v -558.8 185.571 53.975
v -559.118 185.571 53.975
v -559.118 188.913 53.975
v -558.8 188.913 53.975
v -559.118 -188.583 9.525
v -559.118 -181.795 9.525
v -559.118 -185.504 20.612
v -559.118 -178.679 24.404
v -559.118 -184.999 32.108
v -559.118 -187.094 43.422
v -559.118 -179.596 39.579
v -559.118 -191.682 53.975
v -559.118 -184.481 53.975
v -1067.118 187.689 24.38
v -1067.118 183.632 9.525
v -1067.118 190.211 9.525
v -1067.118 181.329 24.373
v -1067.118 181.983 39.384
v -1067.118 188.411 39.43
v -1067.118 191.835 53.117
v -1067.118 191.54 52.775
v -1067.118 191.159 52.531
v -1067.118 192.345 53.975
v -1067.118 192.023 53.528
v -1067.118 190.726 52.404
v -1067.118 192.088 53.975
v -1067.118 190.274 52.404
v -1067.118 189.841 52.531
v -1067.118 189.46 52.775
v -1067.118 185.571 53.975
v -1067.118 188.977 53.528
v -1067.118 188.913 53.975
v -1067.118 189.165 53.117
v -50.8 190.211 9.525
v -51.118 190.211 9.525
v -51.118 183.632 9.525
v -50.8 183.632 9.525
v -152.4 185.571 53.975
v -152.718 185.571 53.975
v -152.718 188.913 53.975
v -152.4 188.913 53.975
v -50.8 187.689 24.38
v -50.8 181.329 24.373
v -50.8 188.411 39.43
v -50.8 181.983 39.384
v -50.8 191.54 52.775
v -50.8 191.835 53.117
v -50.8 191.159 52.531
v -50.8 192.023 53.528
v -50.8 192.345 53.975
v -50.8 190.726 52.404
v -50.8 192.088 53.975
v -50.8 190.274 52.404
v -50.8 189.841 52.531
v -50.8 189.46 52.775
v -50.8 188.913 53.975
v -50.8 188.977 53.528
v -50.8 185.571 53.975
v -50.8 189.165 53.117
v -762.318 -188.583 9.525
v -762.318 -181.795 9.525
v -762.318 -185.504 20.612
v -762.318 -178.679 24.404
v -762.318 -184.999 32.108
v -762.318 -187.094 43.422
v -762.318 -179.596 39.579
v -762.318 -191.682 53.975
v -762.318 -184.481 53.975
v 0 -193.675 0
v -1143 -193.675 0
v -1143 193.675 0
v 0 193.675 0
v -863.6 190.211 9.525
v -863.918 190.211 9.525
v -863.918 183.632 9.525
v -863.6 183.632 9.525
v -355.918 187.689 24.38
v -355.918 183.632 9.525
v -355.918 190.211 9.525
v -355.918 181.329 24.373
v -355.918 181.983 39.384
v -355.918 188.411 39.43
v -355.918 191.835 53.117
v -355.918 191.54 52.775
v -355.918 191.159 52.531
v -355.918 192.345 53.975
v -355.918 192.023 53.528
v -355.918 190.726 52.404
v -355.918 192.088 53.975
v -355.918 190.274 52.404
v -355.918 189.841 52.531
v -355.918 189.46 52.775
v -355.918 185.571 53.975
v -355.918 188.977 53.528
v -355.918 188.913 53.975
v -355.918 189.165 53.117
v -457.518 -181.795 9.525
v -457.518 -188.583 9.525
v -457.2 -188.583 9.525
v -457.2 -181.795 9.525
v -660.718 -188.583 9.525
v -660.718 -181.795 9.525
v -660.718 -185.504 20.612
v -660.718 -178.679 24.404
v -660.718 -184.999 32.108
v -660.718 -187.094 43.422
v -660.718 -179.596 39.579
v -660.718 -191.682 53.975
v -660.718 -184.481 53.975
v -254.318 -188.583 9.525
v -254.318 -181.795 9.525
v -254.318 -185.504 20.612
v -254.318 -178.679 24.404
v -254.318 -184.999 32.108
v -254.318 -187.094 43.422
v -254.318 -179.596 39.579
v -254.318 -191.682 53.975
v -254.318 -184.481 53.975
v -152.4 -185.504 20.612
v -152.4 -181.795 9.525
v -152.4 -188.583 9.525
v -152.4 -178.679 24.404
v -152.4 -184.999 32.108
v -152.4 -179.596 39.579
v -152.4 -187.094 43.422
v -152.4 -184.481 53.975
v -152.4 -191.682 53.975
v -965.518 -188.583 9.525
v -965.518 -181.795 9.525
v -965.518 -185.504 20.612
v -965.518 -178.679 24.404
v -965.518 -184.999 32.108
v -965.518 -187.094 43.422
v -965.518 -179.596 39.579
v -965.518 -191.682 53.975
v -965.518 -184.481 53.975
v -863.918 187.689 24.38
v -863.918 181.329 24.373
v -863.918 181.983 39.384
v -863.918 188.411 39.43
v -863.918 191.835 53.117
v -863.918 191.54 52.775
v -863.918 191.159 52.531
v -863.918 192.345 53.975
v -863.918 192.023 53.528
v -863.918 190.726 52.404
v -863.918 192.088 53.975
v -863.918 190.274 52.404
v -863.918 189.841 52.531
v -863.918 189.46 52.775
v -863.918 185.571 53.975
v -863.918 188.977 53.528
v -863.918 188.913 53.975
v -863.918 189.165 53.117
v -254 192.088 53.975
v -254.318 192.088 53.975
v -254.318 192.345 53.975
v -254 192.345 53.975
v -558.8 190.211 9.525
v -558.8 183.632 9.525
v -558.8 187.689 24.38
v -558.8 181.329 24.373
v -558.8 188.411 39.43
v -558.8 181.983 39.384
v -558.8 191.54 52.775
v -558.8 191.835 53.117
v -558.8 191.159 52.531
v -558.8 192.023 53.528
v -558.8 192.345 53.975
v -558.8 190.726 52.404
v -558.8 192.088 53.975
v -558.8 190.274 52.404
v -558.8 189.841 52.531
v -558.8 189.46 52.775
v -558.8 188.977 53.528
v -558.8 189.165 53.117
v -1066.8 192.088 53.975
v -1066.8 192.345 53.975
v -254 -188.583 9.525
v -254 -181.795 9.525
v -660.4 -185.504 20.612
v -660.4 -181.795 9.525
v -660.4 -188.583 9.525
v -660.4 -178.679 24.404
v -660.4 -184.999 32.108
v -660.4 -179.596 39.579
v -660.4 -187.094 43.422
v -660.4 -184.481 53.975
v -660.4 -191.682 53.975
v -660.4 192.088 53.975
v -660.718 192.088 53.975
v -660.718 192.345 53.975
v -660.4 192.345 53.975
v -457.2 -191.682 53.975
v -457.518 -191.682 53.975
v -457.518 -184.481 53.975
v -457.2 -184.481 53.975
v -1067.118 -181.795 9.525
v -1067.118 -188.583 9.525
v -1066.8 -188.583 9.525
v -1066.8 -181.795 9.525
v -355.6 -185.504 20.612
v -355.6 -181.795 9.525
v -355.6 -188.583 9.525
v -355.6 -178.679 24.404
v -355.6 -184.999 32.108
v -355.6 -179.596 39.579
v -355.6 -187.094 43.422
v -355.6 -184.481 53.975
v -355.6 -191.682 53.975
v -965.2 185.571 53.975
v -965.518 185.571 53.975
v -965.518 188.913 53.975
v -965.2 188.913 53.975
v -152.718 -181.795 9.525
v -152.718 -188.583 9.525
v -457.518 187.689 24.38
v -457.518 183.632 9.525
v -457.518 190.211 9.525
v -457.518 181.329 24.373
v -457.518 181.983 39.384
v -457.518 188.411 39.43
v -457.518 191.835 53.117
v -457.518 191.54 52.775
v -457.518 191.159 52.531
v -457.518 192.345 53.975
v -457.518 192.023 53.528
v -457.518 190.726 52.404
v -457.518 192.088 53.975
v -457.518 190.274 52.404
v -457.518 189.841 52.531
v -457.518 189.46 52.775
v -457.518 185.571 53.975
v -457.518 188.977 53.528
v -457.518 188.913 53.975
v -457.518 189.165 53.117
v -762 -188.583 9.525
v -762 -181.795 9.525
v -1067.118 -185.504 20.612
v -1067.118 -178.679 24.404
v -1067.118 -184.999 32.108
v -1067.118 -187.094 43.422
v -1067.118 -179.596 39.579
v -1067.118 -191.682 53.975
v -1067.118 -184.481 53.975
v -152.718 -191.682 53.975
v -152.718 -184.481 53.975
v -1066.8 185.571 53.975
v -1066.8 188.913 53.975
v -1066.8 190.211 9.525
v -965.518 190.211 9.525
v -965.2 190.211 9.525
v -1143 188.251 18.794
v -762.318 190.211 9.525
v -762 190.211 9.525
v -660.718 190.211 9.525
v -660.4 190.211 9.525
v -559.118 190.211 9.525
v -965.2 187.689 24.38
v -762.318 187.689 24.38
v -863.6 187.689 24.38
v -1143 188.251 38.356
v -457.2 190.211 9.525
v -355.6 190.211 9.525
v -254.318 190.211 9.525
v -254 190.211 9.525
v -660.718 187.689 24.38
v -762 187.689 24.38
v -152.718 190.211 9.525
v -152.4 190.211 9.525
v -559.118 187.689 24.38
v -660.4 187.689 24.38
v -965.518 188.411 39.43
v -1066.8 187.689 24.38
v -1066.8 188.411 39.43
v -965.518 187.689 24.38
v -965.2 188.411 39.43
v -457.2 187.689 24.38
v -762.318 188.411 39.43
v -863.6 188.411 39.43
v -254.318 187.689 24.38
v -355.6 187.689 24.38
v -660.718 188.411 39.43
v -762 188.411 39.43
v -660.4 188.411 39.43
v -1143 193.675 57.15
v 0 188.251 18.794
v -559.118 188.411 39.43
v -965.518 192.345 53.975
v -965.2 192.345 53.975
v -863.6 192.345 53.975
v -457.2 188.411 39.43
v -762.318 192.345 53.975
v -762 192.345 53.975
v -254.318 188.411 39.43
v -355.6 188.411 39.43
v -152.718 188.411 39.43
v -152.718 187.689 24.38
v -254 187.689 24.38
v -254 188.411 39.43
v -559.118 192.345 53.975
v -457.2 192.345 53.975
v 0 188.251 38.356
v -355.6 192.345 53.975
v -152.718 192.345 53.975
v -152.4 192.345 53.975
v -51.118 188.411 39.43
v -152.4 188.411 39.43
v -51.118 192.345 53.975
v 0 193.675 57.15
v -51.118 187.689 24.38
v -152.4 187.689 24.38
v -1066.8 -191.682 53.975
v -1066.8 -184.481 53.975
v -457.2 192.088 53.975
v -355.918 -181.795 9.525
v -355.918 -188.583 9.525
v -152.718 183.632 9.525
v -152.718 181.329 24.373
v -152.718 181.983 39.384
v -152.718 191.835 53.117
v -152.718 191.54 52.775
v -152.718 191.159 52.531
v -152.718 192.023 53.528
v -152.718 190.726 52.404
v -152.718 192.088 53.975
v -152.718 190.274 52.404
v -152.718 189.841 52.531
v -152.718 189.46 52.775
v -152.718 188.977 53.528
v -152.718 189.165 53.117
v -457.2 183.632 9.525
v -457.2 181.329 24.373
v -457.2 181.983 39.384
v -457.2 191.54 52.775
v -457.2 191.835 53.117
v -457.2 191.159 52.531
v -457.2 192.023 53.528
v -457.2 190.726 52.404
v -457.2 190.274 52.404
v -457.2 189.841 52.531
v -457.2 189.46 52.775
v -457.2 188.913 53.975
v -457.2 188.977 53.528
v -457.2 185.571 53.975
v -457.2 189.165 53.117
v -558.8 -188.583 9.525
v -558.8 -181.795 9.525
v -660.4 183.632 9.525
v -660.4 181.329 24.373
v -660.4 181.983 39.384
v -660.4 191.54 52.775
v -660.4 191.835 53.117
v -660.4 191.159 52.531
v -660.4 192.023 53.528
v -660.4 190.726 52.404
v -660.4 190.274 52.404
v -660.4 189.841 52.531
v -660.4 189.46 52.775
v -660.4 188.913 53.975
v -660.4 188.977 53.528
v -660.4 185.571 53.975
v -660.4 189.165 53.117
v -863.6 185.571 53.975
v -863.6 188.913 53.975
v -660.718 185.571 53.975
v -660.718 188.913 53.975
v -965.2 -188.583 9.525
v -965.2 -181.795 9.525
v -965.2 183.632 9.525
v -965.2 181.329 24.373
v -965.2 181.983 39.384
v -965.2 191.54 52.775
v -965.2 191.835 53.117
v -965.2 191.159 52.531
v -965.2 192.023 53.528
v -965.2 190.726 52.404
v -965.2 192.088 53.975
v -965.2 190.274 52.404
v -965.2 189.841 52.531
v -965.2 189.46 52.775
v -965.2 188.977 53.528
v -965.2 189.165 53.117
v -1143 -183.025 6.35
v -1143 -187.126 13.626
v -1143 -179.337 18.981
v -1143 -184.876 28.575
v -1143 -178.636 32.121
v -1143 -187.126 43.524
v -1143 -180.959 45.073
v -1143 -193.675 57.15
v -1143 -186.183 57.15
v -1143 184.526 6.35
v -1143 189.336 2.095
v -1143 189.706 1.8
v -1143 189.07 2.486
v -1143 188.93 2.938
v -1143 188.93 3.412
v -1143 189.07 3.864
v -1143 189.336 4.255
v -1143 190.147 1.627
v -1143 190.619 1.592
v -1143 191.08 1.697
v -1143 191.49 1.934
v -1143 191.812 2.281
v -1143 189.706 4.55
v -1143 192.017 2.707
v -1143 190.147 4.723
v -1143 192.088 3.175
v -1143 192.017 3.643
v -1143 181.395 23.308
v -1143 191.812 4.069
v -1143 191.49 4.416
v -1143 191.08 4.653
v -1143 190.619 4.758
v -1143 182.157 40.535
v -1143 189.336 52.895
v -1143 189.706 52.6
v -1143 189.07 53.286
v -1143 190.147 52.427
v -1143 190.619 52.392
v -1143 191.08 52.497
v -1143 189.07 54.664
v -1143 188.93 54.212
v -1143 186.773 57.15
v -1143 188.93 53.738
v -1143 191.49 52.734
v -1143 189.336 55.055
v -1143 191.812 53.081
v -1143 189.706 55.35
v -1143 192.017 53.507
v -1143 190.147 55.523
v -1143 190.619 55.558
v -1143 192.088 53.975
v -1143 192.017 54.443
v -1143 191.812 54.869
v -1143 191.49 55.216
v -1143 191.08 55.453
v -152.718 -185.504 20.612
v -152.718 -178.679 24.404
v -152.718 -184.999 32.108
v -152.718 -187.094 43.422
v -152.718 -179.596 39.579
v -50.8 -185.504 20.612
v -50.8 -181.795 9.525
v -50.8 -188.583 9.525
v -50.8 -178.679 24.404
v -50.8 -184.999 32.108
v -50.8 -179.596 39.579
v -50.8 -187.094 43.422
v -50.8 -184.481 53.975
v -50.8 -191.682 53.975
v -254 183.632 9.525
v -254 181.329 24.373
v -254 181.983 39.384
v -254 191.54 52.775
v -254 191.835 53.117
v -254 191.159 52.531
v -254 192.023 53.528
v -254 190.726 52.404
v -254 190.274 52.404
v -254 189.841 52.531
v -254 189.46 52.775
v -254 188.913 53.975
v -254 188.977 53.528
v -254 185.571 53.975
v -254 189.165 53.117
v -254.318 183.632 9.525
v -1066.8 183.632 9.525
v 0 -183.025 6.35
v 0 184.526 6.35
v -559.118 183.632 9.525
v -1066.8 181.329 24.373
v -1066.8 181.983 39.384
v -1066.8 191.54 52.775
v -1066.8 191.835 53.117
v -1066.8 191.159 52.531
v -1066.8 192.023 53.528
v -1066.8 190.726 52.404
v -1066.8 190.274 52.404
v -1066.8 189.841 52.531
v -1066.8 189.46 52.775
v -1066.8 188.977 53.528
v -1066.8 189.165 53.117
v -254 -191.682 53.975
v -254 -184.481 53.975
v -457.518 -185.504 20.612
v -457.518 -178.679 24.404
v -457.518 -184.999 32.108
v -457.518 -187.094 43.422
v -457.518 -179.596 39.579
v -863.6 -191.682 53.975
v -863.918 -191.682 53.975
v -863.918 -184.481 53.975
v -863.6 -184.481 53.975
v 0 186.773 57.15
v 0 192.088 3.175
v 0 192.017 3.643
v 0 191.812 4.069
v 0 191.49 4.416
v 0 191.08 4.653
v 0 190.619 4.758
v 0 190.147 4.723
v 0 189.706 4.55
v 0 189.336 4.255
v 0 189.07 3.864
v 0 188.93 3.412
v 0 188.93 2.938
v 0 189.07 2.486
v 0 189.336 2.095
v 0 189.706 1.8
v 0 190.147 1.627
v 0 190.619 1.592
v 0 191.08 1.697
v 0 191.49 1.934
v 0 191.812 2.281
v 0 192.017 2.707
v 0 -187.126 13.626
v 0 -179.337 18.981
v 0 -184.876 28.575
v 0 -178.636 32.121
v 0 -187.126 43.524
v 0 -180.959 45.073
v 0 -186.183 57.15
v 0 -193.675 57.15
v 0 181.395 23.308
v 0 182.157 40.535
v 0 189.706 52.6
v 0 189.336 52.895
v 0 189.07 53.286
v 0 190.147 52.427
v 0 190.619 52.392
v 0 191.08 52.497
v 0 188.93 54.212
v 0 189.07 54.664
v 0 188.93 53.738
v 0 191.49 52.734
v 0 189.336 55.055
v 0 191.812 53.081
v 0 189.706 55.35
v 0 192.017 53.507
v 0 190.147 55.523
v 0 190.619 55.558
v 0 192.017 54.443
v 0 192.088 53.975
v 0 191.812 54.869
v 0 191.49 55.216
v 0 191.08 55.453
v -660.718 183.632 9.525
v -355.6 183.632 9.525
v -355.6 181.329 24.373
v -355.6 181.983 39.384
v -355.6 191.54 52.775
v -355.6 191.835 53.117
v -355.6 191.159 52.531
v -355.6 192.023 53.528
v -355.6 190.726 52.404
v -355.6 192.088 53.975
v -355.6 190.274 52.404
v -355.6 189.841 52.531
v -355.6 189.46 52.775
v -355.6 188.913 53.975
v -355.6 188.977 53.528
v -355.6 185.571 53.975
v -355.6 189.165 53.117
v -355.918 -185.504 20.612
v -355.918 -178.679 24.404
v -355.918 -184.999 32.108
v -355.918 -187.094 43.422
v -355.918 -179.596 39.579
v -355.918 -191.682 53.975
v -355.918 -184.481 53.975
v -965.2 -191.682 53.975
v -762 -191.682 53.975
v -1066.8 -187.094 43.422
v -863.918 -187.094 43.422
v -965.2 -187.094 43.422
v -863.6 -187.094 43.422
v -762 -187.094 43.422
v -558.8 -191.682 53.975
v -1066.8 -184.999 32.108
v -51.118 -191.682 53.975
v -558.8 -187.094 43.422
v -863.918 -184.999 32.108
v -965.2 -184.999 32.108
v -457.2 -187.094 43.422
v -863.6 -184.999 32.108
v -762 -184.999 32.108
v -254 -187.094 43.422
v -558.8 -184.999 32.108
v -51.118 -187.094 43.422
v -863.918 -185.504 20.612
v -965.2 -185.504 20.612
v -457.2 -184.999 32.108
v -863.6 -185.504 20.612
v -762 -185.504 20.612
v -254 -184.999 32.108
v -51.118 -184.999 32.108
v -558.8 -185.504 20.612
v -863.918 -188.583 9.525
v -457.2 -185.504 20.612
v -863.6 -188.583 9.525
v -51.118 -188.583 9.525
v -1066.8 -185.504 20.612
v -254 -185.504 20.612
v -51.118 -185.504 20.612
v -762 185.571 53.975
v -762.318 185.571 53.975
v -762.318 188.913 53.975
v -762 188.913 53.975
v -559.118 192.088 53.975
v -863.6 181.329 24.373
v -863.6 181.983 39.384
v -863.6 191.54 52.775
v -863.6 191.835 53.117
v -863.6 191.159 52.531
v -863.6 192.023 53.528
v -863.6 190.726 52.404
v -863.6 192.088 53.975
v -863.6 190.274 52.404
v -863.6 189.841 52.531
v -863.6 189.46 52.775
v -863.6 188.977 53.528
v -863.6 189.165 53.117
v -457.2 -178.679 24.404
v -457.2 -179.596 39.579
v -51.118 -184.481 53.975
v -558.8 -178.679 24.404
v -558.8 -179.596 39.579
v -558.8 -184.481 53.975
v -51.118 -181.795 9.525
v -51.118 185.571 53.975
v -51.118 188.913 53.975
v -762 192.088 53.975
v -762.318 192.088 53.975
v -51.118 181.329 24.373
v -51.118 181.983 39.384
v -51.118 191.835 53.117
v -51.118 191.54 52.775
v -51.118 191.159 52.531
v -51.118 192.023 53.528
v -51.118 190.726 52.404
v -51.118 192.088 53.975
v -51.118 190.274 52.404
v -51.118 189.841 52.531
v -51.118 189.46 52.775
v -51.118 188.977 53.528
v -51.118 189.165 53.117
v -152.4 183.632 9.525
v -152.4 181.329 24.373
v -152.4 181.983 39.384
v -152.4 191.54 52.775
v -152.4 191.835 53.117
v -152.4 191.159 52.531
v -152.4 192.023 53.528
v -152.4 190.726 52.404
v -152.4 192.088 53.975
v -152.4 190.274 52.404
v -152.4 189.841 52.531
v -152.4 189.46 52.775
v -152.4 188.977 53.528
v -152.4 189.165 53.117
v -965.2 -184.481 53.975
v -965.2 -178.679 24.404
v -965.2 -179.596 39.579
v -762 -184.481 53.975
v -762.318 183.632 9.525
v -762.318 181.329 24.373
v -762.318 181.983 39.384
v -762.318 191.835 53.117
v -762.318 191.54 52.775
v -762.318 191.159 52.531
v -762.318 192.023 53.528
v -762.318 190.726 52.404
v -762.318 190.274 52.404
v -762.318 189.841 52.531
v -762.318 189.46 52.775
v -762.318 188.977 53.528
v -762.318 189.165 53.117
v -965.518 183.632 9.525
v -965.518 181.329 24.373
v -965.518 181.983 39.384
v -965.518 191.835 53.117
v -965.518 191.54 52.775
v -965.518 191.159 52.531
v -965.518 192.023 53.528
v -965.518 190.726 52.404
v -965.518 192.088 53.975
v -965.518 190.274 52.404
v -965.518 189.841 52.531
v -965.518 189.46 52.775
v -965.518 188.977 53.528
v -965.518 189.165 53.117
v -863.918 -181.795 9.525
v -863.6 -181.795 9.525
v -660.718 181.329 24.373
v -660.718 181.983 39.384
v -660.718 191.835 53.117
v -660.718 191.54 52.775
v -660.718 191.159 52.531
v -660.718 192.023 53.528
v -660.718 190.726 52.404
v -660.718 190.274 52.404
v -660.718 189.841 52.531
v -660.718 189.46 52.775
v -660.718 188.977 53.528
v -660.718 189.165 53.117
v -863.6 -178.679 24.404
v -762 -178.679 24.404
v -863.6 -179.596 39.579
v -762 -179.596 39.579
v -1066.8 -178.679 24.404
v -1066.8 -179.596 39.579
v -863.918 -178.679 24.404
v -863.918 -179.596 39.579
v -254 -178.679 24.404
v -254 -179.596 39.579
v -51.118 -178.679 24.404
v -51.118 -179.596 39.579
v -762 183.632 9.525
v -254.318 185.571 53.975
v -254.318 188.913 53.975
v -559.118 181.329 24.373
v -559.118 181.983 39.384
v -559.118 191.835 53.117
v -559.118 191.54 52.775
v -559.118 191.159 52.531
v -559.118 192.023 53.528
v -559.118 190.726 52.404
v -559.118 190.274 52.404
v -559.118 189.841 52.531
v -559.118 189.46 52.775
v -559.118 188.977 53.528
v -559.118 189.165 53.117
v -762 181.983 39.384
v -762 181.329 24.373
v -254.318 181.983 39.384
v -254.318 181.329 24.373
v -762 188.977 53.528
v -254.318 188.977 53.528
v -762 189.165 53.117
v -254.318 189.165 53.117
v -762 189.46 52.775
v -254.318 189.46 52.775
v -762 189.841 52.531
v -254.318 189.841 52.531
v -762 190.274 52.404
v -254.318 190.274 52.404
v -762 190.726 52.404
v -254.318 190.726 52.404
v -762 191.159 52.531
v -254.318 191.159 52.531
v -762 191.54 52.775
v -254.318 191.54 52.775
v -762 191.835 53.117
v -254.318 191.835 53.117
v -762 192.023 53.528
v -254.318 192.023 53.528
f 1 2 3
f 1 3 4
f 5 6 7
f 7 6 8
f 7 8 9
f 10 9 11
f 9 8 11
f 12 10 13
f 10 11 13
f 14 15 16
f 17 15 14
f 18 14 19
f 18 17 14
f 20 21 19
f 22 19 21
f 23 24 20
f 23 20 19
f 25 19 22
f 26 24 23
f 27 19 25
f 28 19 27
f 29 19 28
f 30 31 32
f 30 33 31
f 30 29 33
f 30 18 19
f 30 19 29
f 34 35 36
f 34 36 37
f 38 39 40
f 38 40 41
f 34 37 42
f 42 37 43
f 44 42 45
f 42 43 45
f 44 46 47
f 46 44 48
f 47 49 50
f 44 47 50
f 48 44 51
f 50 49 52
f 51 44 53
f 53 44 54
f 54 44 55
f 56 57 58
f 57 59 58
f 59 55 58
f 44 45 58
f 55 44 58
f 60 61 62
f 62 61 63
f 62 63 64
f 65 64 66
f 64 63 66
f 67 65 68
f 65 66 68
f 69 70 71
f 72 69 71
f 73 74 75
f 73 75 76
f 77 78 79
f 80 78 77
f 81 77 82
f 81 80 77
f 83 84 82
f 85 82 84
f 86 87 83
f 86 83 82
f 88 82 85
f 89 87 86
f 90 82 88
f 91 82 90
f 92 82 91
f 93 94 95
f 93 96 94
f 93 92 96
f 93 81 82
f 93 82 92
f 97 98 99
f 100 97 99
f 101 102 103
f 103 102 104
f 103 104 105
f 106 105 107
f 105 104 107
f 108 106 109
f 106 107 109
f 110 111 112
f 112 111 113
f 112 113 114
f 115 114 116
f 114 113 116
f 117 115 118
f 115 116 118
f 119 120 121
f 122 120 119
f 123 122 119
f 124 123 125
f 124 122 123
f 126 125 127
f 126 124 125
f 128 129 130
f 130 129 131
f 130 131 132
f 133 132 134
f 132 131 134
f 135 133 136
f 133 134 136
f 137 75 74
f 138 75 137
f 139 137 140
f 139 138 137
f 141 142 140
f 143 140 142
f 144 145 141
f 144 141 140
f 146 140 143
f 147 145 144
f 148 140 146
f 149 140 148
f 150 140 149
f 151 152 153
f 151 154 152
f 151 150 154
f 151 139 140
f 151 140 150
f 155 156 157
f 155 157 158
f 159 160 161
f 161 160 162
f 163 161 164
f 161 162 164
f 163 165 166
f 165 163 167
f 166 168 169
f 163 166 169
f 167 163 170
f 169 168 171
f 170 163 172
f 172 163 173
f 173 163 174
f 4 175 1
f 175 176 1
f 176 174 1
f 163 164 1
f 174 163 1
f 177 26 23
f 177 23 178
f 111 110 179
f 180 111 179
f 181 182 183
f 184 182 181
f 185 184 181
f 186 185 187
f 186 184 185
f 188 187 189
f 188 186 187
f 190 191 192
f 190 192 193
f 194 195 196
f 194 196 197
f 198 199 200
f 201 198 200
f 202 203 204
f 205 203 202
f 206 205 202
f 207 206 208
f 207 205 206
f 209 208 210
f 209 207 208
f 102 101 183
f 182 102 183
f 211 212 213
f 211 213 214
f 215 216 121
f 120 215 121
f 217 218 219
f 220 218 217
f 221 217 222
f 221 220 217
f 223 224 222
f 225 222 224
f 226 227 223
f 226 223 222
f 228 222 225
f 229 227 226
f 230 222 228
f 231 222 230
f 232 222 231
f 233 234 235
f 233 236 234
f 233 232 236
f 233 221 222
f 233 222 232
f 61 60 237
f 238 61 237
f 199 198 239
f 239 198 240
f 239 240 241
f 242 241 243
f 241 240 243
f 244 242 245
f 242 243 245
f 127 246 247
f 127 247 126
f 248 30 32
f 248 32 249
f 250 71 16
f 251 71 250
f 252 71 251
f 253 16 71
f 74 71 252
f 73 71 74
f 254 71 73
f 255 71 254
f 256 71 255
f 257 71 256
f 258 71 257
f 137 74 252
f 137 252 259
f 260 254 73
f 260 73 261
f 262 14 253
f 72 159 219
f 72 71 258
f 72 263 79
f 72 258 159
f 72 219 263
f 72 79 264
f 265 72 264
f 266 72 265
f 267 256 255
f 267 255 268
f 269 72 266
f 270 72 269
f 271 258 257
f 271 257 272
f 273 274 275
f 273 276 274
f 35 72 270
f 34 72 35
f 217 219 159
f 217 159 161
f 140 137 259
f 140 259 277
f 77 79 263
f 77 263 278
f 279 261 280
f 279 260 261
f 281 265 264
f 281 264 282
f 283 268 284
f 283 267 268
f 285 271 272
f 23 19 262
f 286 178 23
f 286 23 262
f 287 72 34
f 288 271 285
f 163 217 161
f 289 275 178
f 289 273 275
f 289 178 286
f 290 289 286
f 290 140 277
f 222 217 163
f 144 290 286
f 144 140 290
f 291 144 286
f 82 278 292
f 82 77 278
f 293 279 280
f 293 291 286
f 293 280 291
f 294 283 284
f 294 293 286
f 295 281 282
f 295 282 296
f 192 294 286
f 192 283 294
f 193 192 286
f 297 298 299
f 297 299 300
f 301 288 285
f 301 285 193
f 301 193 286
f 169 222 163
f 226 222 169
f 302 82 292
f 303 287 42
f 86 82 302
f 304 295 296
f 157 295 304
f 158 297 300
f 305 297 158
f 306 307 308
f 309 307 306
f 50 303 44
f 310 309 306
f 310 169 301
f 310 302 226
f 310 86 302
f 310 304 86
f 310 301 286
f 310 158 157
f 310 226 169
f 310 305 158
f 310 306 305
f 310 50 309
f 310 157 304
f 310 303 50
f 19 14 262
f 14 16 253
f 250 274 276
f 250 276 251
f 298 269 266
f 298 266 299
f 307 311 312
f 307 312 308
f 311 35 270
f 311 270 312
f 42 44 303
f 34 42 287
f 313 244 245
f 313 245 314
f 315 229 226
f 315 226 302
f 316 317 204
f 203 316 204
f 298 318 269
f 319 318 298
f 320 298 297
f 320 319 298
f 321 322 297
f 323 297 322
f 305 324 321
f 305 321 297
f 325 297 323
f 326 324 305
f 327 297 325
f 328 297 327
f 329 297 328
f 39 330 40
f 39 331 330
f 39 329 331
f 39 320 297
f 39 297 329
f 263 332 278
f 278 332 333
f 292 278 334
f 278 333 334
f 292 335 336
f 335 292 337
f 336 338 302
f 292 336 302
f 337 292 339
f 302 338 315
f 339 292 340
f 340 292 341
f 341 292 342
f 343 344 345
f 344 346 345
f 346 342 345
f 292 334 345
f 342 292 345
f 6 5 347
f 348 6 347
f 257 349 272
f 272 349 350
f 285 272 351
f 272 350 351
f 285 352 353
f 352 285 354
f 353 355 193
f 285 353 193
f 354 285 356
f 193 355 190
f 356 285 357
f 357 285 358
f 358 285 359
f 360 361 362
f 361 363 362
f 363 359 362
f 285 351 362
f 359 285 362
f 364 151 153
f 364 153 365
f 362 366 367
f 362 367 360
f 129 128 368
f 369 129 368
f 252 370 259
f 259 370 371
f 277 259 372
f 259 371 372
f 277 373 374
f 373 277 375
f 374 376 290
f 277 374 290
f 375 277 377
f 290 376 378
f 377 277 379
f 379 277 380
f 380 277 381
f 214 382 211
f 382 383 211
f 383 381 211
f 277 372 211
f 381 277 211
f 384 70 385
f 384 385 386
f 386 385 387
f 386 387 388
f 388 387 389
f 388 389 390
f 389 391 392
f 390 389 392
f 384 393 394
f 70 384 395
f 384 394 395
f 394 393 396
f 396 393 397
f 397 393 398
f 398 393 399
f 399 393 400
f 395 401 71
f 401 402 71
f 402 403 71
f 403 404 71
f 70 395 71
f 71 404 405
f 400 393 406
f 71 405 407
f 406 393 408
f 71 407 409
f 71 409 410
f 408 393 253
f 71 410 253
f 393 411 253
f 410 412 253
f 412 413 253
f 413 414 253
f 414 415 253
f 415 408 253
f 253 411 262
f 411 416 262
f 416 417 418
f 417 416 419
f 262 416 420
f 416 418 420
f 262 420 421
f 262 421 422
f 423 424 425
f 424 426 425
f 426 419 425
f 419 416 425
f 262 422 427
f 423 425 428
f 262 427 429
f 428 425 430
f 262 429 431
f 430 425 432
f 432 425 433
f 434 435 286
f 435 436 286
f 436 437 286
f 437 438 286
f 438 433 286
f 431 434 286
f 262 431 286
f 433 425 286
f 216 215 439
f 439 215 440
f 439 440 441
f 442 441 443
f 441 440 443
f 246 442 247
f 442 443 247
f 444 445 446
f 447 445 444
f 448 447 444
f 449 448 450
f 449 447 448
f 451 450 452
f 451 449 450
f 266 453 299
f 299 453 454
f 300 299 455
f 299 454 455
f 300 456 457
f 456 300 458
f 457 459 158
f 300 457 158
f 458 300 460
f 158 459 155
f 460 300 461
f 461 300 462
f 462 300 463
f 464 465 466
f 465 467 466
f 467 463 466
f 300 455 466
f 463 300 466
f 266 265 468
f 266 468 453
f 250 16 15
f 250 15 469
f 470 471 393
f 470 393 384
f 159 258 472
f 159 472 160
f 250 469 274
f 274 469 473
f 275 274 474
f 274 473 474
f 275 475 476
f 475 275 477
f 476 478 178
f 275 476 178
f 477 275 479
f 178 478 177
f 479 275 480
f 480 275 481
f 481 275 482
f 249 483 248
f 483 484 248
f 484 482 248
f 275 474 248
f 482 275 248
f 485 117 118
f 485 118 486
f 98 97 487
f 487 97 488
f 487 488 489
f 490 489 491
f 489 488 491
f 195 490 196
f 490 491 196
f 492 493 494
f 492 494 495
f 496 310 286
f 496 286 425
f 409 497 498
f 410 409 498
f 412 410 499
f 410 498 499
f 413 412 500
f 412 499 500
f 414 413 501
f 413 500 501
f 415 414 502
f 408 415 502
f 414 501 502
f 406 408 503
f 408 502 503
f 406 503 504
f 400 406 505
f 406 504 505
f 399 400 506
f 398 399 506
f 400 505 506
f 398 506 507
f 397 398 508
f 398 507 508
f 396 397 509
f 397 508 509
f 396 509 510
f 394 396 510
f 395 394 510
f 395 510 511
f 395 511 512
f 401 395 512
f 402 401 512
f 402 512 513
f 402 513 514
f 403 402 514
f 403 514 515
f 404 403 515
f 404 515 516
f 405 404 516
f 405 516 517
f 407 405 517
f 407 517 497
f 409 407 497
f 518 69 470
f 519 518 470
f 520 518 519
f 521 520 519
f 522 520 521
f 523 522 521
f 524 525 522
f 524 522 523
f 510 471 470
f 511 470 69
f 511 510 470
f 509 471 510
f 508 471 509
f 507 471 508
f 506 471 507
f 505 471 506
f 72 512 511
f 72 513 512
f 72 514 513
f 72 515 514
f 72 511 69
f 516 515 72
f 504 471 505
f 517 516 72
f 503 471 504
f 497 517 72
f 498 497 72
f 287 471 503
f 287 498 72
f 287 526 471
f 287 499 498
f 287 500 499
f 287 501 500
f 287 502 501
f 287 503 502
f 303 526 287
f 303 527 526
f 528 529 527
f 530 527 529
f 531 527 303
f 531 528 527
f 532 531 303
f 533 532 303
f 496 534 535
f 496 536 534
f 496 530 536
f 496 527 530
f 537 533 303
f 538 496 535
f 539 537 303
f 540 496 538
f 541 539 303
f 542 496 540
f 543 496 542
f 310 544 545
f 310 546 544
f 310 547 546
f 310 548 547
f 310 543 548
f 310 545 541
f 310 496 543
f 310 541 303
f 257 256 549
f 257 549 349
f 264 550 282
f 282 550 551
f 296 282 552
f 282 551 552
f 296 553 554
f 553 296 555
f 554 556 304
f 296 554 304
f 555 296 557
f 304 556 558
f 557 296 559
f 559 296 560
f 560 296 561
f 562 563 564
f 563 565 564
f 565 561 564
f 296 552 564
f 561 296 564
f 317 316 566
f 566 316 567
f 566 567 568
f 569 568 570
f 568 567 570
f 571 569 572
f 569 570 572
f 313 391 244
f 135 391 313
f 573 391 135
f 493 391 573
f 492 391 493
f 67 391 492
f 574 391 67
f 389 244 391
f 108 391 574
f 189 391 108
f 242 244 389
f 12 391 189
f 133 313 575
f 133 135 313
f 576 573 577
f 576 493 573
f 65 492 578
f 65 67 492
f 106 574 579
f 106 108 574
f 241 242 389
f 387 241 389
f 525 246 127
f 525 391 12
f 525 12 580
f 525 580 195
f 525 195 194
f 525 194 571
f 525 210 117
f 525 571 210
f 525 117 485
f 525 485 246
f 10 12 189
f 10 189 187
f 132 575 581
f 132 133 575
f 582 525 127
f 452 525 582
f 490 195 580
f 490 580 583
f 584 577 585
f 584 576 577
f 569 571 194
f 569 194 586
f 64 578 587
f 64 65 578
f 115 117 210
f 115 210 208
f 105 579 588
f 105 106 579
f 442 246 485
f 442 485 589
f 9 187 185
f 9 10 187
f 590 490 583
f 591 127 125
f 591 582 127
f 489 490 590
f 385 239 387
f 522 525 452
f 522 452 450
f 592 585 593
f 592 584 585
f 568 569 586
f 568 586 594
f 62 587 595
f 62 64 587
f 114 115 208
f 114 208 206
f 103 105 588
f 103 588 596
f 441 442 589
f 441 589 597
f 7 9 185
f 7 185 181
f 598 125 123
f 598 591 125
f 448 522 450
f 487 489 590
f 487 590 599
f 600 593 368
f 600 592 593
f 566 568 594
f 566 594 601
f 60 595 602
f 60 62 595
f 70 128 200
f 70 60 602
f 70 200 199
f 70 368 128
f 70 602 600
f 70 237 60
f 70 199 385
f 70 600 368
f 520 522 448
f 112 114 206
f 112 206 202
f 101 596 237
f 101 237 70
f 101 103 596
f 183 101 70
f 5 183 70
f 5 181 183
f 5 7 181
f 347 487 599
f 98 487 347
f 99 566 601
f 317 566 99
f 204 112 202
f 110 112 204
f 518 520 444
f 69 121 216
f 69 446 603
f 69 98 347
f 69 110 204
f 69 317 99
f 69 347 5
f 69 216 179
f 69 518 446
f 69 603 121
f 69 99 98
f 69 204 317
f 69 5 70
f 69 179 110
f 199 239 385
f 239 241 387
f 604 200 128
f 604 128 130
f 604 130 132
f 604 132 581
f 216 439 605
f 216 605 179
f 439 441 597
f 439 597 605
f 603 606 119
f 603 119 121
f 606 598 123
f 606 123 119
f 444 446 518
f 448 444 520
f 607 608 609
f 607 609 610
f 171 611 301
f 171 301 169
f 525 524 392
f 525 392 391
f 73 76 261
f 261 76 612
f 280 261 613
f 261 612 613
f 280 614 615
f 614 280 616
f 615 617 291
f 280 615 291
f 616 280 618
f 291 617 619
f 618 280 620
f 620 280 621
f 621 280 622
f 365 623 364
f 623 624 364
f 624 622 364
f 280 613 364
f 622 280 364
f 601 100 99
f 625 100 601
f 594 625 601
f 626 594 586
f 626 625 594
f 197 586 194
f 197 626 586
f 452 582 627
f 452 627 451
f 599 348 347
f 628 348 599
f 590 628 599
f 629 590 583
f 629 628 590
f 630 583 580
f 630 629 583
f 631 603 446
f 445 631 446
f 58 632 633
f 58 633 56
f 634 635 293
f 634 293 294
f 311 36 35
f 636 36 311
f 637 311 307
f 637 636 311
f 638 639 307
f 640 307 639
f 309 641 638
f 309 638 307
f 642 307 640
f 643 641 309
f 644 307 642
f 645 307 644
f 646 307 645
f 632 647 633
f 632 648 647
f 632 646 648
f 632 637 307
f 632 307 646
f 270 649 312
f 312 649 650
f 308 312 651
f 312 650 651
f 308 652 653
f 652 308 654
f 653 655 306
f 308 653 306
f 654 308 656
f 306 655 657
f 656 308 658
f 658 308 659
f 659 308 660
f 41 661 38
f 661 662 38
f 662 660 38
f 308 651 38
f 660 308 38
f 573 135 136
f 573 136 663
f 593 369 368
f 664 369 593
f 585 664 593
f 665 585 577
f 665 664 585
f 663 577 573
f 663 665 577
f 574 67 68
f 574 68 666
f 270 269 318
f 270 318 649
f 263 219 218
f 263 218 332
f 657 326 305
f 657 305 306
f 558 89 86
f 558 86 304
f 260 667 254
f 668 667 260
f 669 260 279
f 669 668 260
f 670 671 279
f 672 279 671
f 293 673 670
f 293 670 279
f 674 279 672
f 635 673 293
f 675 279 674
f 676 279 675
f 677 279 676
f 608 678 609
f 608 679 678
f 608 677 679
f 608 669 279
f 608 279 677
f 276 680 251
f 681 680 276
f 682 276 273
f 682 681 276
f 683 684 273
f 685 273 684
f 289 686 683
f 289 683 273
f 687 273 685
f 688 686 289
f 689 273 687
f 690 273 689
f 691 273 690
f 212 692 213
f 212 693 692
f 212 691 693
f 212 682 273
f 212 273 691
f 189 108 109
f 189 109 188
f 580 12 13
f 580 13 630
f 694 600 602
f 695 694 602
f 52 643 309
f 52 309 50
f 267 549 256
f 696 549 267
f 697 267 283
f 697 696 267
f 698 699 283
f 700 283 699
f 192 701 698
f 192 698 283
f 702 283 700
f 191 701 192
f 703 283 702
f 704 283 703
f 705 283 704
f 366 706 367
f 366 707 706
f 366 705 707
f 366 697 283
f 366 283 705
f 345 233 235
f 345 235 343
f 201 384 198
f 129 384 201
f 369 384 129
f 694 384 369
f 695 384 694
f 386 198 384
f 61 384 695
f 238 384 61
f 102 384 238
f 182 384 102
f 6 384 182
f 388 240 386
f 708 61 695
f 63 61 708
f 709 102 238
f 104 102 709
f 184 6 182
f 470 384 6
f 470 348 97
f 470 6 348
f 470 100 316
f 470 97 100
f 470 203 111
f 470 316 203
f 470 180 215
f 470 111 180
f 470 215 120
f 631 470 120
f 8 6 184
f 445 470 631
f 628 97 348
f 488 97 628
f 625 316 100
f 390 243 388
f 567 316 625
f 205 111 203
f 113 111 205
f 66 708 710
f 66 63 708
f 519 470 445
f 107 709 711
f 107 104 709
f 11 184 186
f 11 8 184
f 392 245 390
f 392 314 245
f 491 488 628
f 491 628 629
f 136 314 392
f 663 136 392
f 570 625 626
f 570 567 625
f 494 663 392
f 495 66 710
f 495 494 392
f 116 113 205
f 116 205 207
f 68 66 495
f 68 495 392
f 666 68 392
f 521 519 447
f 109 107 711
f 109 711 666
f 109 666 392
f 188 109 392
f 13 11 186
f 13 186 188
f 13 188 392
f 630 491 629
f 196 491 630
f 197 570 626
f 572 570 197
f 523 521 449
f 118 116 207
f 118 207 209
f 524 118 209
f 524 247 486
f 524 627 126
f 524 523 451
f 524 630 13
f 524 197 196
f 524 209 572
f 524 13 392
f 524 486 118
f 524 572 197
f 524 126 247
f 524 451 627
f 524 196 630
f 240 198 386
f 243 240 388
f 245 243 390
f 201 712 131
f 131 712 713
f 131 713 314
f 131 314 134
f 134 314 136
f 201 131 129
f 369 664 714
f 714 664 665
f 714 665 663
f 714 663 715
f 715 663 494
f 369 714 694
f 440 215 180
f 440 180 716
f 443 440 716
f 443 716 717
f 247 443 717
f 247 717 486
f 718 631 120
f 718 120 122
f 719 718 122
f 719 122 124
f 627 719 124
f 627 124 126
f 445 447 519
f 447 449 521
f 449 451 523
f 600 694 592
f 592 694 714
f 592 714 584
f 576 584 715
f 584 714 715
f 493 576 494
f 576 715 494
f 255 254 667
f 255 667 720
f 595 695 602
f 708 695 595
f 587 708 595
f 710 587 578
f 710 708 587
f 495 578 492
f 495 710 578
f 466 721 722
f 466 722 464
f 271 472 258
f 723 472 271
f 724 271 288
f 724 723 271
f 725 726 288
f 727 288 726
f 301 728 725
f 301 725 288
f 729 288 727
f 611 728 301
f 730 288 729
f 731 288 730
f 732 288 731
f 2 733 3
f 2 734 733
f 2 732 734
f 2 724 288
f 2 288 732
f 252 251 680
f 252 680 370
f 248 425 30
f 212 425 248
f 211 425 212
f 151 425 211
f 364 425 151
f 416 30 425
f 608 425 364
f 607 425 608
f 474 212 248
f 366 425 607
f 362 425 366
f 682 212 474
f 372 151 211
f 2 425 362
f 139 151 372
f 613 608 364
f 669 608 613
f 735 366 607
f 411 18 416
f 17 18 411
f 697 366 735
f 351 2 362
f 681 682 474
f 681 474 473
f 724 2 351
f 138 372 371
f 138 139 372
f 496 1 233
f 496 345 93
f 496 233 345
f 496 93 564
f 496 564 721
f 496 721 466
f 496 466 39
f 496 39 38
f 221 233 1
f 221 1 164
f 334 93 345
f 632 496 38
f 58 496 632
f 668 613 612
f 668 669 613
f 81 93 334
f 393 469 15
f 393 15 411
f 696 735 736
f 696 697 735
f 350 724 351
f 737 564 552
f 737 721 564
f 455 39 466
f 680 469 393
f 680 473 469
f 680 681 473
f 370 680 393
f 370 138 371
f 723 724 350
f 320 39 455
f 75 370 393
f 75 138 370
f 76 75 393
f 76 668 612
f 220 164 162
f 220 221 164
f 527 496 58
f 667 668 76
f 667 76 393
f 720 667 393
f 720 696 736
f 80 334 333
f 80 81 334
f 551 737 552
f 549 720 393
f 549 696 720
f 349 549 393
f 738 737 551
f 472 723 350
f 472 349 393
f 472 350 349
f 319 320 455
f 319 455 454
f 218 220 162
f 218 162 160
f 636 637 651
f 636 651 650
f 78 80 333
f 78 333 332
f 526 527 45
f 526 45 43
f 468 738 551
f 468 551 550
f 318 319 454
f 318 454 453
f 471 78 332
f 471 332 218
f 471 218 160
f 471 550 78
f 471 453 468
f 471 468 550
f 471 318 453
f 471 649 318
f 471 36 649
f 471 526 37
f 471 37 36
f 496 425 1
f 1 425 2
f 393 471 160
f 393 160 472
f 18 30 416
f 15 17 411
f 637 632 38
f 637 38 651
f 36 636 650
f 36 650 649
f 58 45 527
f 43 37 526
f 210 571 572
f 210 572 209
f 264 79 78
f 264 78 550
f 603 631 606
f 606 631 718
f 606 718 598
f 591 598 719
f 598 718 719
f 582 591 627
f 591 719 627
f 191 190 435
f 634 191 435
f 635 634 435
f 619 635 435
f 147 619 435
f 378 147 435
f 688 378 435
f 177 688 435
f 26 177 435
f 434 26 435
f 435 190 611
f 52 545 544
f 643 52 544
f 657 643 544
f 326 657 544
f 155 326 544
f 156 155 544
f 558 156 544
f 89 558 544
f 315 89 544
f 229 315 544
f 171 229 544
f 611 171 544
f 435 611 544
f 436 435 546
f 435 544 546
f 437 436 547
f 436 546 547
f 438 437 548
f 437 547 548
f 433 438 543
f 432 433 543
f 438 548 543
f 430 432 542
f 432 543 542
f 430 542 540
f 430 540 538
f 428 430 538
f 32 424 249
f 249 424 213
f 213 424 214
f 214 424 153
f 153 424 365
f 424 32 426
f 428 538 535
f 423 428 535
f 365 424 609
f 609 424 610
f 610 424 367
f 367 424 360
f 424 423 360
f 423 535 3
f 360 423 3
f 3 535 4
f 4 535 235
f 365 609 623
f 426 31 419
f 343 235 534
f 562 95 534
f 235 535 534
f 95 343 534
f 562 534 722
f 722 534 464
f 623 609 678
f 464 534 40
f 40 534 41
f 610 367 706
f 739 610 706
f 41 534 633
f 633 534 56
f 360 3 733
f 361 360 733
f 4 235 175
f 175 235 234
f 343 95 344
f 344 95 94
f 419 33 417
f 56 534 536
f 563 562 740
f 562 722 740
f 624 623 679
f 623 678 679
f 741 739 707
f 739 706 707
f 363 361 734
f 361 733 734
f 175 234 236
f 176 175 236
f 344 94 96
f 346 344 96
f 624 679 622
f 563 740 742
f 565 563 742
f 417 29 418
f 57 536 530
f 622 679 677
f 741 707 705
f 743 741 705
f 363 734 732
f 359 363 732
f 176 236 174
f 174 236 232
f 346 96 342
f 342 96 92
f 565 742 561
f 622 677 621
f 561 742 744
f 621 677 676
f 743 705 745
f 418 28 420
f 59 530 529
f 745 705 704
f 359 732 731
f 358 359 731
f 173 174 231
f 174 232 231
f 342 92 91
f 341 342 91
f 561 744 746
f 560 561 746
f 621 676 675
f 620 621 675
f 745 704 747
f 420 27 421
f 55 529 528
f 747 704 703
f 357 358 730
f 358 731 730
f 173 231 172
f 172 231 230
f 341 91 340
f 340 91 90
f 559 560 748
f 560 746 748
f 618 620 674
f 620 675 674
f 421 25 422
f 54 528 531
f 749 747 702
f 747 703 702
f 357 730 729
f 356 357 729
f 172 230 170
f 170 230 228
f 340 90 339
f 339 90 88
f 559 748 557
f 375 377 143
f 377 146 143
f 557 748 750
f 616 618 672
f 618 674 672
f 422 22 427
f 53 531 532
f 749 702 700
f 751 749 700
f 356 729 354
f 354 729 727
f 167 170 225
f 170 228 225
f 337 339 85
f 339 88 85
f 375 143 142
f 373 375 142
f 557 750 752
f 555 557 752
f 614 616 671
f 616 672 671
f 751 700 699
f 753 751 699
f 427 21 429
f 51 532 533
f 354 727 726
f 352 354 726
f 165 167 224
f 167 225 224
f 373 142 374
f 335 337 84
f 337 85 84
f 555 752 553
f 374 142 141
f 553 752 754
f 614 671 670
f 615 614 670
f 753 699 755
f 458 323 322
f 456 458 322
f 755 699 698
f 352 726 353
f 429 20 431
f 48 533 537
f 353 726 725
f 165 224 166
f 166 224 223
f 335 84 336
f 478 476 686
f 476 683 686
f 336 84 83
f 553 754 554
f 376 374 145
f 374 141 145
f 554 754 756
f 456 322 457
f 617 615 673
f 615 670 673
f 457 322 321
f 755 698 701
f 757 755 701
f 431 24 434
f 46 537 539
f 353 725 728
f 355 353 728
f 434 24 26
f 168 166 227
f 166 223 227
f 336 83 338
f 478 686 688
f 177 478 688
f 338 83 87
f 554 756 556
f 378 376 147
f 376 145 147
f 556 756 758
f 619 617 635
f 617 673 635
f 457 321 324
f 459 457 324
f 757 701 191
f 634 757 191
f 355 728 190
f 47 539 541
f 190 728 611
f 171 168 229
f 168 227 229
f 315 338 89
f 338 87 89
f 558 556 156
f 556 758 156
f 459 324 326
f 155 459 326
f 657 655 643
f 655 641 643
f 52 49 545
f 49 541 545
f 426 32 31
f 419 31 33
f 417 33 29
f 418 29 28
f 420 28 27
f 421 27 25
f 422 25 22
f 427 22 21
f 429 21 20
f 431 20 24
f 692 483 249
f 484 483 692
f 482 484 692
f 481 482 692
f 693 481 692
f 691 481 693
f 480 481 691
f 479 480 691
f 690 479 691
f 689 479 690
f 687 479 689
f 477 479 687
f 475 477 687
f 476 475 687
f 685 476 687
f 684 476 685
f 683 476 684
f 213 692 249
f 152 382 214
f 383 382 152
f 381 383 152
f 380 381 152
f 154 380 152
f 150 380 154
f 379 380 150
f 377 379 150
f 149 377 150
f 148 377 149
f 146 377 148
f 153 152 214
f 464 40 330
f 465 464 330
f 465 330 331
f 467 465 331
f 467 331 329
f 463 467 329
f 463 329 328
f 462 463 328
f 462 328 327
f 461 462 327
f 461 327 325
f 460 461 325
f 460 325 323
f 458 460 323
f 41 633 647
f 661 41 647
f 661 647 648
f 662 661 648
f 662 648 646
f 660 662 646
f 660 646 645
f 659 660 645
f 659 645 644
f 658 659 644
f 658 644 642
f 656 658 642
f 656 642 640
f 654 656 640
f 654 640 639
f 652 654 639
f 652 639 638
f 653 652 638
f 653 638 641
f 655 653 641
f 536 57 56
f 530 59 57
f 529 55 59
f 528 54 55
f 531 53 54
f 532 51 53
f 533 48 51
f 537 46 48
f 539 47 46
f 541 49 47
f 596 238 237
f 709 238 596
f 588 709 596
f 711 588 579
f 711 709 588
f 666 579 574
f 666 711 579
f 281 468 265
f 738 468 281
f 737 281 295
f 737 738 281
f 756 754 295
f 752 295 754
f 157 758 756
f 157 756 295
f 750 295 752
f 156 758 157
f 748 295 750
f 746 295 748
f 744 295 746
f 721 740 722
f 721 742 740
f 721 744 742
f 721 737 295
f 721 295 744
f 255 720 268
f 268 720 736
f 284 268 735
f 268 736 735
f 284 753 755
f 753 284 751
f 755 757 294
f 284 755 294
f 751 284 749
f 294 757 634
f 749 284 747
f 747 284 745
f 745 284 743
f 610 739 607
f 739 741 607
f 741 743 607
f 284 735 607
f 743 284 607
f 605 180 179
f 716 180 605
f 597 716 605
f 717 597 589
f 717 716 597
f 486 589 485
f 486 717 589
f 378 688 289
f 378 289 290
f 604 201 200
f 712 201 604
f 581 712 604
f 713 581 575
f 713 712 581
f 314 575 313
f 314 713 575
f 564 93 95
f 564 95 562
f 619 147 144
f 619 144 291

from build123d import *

# Parameters (mm, degrees)
F1_DEPTH      = 1143
F2_R          = 1.5875
F3_DEPTH      = 1143.001
F4_W          = 0.3175
F4_H          = 44.45
F5_DEPTH      = 193.3445428183
F5_DEPTH_BACK = 192.6822115509


with BuildPart() as f1:
    # F0 (on Right) → F1 (new body)
    with BuildSketch(Plane.YZ):
        with BuildLine():
            ThreePointArc((-193.675, 57.15), (-184.8763020632, 28.575), (-193.675, 0))
            Line((-193.675, 0), (193.675, 0))
            ThreePointArc((193.675, 0), (187.5626801821, 28.575), (193.675, 57.15))
            Line((193.675, 57.15), (186.7733895925, 57.15))
            ThreePointArc((186.7733895925, 57.15), (181.2871488449, 31.94300811), (184.5258543835, 6.35))
            Line((184.5258543835, 6.35), (-183.0248835163, 6.35))
            ThreePointArc((-183.0248835163, 6.35), (-178.6364166438, 32.1209796041), (-186.1829502369, 57.15))
            Line((-186.1829502369, 57.15), (-193.675, 57.15))
        make_face()
    extrude(amount=-F1_DEPTH)

    # F2 (on face) → F3 (cut, through all)
    with BuildSketch(Plane.YZ):
        with Locations((190.5, 53.975)):
            Circle(F2_R)
        with Locations((190.5, 3.175)):
            Circle(F2_R)
    extrude(amount=-F3_DEPTH, mode=Mode.SUBTRACT)

    # F4 (on Front) → F5 (cut, two sides)
    with BuildSketch(Plane.XZ) as f5_sk:
        with Locations((-50.95875, 31.75)):
            Rectangle(F4_W, F4_H)
        with Locations((-152.55875, 31.75)):
            Rectangle(F4_W, F4_H)
        with Locations((-254.15875, 31.75)):
            Rectangle(F4_W, F4_H)
        with Locations((-355.75875, 31.75)):
            Rectangle(F4_W, F4_H)
        with Locations((-457.35875, 31.75)):
            Rectangle(F4_W, F4_H)
        with Locations((-558.95875, 31.75)):
            Rectangle(F4_W, F4_H)
        with Locations((-660.55875, 31.75)):
            Rectangle(F4_W, F4_H)
        with Locations((-762.15875, 31.75)):
            Rectangle(F4_W, F4_H)
        with Locations((-863.75875, 31.75)):
            Rectangle(F4_W, F4_H)
        with Locations((-965.35875, 31.75)):
            Rectangle(F4_W, F4_H)
        with Locations((-1066.95875, 31.75)):
            Rectangle(F4_W, F4_H)
        with Locations((-1168.55875, 31.75)):
            Rectangle(F4_W, F4_H)
    extrude(amount=-F5_DEPTH, mode=Mode.SUBTRACT)
    extrude(f5_sk.sketch, amount=F5_DEPTH_BACK, mode=Mode.SUBTRACT)


solid = f1.part
